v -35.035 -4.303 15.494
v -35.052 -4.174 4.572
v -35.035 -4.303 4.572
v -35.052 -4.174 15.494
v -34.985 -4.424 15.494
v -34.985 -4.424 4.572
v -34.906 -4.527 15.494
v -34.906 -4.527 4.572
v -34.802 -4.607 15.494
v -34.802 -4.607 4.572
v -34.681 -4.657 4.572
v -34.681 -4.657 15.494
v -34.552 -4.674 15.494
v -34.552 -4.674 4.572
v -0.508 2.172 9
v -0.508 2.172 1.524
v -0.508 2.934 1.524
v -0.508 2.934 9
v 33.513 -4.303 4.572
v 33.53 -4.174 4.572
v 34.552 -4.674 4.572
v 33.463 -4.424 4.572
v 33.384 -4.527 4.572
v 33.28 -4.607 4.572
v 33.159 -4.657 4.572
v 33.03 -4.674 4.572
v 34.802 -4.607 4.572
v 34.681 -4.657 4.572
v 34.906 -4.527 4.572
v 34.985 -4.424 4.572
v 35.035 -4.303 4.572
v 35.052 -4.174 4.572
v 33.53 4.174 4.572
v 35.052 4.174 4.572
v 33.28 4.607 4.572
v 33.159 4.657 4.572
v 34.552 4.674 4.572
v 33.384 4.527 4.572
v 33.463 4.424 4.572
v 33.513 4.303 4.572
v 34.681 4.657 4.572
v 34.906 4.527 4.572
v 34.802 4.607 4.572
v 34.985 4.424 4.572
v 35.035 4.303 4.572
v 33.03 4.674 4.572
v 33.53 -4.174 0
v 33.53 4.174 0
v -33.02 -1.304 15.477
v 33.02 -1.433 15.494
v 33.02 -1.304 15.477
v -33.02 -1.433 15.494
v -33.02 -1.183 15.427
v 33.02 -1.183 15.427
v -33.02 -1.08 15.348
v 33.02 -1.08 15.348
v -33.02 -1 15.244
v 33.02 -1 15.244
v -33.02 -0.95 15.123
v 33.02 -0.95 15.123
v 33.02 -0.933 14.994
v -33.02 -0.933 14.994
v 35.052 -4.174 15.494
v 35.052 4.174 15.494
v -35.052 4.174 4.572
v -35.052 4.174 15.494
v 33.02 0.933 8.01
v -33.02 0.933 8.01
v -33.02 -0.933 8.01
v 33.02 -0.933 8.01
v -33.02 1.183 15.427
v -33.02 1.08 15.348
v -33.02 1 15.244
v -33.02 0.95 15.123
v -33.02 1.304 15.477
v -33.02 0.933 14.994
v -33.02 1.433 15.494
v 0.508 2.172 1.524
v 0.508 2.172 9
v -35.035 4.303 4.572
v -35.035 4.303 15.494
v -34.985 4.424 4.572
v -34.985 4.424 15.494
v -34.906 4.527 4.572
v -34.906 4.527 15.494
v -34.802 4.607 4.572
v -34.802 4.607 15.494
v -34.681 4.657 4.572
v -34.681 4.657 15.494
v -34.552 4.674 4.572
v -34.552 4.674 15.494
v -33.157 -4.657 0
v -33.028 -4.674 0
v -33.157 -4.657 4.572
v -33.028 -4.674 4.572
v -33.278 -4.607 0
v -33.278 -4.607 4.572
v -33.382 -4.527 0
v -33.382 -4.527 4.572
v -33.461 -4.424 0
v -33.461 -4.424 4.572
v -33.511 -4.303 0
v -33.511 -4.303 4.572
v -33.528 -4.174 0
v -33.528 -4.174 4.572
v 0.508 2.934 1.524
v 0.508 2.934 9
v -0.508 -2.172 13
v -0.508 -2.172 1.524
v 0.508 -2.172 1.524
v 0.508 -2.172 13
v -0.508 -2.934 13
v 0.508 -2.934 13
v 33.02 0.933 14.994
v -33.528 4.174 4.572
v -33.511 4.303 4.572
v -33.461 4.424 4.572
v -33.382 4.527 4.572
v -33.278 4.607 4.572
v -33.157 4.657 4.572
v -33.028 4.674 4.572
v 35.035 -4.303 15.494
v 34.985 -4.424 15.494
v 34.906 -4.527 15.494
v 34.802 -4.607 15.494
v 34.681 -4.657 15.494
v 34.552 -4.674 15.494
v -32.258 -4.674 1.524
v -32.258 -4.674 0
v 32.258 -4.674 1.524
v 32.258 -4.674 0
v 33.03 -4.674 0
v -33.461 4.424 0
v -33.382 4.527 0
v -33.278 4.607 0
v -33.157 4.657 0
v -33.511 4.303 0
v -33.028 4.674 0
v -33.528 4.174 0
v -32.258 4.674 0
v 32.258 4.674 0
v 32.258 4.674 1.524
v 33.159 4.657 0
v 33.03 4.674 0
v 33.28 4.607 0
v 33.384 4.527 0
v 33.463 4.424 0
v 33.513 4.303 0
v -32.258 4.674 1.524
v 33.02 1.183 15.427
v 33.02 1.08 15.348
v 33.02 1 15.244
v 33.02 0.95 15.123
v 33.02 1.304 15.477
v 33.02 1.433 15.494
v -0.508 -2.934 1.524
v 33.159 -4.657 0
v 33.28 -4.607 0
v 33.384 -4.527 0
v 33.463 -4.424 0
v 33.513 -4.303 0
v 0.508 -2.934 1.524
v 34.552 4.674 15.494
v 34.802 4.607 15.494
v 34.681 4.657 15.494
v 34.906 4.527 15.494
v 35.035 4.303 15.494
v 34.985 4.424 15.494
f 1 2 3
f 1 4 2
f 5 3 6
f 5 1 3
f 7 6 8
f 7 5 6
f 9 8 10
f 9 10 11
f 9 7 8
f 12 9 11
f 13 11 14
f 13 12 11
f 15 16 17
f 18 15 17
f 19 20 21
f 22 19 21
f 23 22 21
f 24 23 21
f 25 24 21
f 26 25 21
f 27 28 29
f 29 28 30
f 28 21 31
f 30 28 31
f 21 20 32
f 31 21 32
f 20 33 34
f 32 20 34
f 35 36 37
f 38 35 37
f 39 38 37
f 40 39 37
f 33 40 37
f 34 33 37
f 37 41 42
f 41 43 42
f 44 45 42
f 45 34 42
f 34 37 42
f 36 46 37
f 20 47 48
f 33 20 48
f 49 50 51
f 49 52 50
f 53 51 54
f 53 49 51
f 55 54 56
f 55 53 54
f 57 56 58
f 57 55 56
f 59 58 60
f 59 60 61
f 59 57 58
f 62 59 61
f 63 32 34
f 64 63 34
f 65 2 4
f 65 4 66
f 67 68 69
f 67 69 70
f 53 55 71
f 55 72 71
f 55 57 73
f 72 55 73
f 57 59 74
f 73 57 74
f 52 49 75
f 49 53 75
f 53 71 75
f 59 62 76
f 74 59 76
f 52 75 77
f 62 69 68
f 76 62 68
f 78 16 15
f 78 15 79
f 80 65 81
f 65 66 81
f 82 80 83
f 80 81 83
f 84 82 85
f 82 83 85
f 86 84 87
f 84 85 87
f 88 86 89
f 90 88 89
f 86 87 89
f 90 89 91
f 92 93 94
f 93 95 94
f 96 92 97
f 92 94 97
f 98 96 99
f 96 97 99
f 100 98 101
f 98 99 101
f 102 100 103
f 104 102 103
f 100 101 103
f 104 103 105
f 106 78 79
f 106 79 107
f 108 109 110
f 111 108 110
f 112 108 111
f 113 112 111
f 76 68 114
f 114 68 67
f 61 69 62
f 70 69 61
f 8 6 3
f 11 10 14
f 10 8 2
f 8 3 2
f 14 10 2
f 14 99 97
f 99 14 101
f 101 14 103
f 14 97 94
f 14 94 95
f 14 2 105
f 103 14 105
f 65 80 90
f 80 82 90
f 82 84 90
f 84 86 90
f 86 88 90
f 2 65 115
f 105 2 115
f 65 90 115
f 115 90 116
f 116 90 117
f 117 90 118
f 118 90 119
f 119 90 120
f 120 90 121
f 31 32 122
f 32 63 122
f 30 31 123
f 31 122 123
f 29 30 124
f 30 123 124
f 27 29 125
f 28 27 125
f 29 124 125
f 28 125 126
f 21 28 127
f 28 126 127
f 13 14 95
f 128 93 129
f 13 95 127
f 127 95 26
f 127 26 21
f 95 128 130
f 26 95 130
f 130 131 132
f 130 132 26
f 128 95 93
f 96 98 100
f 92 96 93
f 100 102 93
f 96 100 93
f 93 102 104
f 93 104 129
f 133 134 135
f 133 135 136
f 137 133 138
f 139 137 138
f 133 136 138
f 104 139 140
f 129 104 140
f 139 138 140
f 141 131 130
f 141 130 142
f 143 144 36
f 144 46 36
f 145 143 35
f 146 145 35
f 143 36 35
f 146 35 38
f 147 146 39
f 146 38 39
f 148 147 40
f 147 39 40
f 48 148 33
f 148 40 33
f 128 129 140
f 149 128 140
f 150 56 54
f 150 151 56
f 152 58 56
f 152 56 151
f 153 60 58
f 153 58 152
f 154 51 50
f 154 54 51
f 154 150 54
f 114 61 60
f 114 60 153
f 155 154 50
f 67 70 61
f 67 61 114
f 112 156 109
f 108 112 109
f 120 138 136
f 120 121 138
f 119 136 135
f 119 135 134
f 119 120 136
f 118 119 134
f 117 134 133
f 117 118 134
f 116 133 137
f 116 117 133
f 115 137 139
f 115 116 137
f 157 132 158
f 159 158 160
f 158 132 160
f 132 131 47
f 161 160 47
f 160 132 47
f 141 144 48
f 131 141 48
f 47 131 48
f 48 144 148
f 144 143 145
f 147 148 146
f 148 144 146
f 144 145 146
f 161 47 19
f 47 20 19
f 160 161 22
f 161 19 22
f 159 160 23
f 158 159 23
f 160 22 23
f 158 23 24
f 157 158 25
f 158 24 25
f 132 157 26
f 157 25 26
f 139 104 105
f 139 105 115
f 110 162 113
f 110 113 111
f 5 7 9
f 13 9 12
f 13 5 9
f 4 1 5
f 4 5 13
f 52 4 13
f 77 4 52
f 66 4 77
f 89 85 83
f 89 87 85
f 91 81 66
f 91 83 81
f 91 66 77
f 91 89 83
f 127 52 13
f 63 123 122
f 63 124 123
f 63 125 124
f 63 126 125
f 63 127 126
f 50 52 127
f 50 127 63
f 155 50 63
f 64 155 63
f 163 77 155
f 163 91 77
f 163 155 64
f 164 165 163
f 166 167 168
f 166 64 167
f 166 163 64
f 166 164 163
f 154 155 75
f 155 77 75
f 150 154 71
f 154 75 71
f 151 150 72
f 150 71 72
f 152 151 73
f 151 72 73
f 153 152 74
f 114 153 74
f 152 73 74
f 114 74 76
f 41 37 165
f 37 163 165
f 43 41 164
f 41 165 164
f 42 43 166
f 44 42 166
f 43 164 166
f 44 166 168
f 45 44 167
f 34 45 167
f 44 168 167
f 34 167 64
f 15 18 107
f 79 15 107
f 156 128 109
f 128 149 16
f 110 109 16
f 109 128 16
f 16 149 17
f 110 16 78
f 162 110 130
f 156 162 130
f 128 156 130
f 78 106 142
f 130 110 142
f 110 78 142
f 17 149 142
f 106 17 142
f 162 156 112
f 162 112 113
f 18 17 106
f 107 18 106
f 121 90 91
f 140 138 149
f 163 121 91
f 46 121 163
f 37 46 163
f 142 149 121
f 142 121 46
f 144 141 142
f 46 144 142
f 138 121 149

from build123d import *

# Parameters (mm, degrees)
BOX_W        = 70.104
BOX_H        = 9.3472
BOX_DEPTH    = 15.494
BOX001_W     = 66.04
BOX001_H     = 1.8669
BOX001_DEPTH = 7.493
BOX002_W     = 1.524
BOX002_H     = 9.3472
BOX002_DEPTH = 4.572
BOX003_W     = 1.524
BOX003_H     = 9.3472
BOX003_DEPTH = 4.572
FILLET_R     = 0.5
FILLET001_R  = 0.5
FILLET002_R  = 0.5
FILLET003_R  = 0.5
FILLET004_R  = 0.5
FILLET005_R  = 0.5
FILLET006_R  = 0.5
FILLET007_R  = 0.5
FILLET008_R  = 0.5
FILLET009_R  = 0.5
BOX004_W     = 64.516
BOX004_H     = 9.3472
BOX004_DEPTH = 1.524
BOX005_W     = 1.016
BOX005_H     = 0.762
BOX005_DEPTH = 13
BOX006_W     = 1.016
BOX006_H     = 0.762
BOX006_DEPTH = 9


with BuildPart() as part:
    # Box → Box (join)
    with BuildSketch(Plane(origin=(-35.052, -4.6736, 0), x_dir=(1, 0, 0), z_dir=(0, 0, 1))):
        with Locations((35.052, 4.6736)):
            Rectangle(BOX_W, BOX_H)
    extrude(amount=BOX_DEPTH)

    # Box001 → Box001 (cut)
    with BuildSketch(Plane(origin=(-33.02, -0.93345, 8.01), x_dir=(1, 0, 0), z_dir=(0, 0, 1))):
        with Locations((33.02, 0.93345)):
            Rectangle(BOX001_W, BOX001_H)
    extrude(amount=BOX001_DEPTH, mode=Mode.SUBTRACT)

    # Box002 → Box002 (cut)
    with BuildSketch(Plane(origin=(-35.052, -4.6736, 0), x_dir=(1, 0, 0), z_dir=(0, 0, 1))):
        with Locations((0.762, 4.6736)):
            Rectangle(BOX002_W, BOX002_H)
    extrude(amount=BOX002_DEPTH, mode=Mode.SUBTRACT)

    # Box003 → Box003 (cut)
    with BuildSketch(Plane(origin=(33.53, -4.6736, 0), x_dir=(1, 0, 0), z_dir=(0, 0, 1))):
        with Locations((0.762, 4.6736)):
            Rectangle(BOX003_W, BOX003_H)
    extrude(amount=BOX003_DEPTH, mode=Mode.SUBTRACT)

    # Fillet
    fillet_edges = [part.edges().sort_by_distance(p)[0] for p in [
        (-35.052, -4.6736, 10.033),
    ]]
    fillet(fillet_edges, radius=FILLET_R)

    # Fillet001
    fillet001_edges = [part.edges().sort_by_distance(p)[0] for p in [
        (-35.052, 4.6736, 10.033),
    ]]
    fillet(fillet001_edges, radius=FILLET001_R)

    # Fillet002
    fillet002_edges = [part.edges().sort_by_distance(p)[0] for p in [
        (-33.528, -4.6736, 2.286),
    ]]
    fillet(fillet002_edges, radius=FILLET002_R)

    # Fillet003
    fillet003_edges = [part.edges().sort_by_distance(p)[0] for p in [
        (-33.528, 4.6736, 2.286),
    ]]
    fillet(fillet003_edges, radius=FILLET003_R)

    # Fillet004
    fillet004_edges = [part.edges().sort_by_distance(p)[0] for p in [
        (33.53, -4.6736, 2.286),
    ]]
    fillet(fillet004_edges, radius=FILLET004_R)

    # Fillet005
    fillet005_edges = [part.edges().sort_by_distance(p)[0] for p in [
        (35.052, -4.6736, 10.033),
    ]]
    fillet(fillet005_edges, radius=FILLET005_R)

    # Fillet006
    fillet006_edges = [part.edges().sort_by_distance(p)[0] for p in [
        (33.53, 4.6736, 2.286),
    ]]
    fillet(fillet006_edges, radius=FILLET006_R)

    # Fillet007
    fillet007_edges = [part.edges().sort_by_distance(p)[0] for p in [
        (35.052, 4.6736, 10.033),
    ]]
    fillet(fillet007_edges, radius=FILLET007_R)

    # Fillet008
    fillet008_edges = [part.edges().sort_by_distance(p)[0] for p in [
        (0, -0.93345, 15.494),
    ]]
    fillet(fillet008_edges, radius=FILLET008_R)

    # Fillet009
    fillet009_edges = [part.edges().sort_by_distance(p)[0] for p in [
        (0, 0.93345, 15.494),
    ]]
    fillet(fillet009_edges, radius=FILLET009_R)

    # Box004 → Box004 (cut)
    with BuildSketch(Plane(origin=(-32.258, -4.6736, 0), x_dir=(1, 0, 0), z_dir=(0, 0, 1))):
        with Locations((32.258, 4.6736)):
            Rectangle(BOX004_W, BOX004_H)
    extrude(amount=BOX004_DEPTH, mode=Mode.SUBTRACT)

    # Box005 → Box005 (cut)
    with BuildSketch(Plane(origin=(-0.508, -2.9337, 0), x_dir=(1, 0, 0), z_dir=(0, 0, 1))):
        with Locations((0.508, 0.381)):
            Rectangle(BOX005_W, BOX005_H)
    extrude(amount=BOX005_DEPTH, mode=Mode.SUBTRACT)

    # Box006 → Box006 (cut)
    with BuildSketch(Plane(origin=(-0.508, 2.1717, 0), x_dir=(1, 0, 0), z_dir=(0, 0, 1))):
        with Locations((0.508, 0.381)):
            Rectangle(BOX006_W, BOX006_H)
    extrude(amount=BOX006_DEPTH, mode=Mode.SUBTRACT)


solid = part.part
